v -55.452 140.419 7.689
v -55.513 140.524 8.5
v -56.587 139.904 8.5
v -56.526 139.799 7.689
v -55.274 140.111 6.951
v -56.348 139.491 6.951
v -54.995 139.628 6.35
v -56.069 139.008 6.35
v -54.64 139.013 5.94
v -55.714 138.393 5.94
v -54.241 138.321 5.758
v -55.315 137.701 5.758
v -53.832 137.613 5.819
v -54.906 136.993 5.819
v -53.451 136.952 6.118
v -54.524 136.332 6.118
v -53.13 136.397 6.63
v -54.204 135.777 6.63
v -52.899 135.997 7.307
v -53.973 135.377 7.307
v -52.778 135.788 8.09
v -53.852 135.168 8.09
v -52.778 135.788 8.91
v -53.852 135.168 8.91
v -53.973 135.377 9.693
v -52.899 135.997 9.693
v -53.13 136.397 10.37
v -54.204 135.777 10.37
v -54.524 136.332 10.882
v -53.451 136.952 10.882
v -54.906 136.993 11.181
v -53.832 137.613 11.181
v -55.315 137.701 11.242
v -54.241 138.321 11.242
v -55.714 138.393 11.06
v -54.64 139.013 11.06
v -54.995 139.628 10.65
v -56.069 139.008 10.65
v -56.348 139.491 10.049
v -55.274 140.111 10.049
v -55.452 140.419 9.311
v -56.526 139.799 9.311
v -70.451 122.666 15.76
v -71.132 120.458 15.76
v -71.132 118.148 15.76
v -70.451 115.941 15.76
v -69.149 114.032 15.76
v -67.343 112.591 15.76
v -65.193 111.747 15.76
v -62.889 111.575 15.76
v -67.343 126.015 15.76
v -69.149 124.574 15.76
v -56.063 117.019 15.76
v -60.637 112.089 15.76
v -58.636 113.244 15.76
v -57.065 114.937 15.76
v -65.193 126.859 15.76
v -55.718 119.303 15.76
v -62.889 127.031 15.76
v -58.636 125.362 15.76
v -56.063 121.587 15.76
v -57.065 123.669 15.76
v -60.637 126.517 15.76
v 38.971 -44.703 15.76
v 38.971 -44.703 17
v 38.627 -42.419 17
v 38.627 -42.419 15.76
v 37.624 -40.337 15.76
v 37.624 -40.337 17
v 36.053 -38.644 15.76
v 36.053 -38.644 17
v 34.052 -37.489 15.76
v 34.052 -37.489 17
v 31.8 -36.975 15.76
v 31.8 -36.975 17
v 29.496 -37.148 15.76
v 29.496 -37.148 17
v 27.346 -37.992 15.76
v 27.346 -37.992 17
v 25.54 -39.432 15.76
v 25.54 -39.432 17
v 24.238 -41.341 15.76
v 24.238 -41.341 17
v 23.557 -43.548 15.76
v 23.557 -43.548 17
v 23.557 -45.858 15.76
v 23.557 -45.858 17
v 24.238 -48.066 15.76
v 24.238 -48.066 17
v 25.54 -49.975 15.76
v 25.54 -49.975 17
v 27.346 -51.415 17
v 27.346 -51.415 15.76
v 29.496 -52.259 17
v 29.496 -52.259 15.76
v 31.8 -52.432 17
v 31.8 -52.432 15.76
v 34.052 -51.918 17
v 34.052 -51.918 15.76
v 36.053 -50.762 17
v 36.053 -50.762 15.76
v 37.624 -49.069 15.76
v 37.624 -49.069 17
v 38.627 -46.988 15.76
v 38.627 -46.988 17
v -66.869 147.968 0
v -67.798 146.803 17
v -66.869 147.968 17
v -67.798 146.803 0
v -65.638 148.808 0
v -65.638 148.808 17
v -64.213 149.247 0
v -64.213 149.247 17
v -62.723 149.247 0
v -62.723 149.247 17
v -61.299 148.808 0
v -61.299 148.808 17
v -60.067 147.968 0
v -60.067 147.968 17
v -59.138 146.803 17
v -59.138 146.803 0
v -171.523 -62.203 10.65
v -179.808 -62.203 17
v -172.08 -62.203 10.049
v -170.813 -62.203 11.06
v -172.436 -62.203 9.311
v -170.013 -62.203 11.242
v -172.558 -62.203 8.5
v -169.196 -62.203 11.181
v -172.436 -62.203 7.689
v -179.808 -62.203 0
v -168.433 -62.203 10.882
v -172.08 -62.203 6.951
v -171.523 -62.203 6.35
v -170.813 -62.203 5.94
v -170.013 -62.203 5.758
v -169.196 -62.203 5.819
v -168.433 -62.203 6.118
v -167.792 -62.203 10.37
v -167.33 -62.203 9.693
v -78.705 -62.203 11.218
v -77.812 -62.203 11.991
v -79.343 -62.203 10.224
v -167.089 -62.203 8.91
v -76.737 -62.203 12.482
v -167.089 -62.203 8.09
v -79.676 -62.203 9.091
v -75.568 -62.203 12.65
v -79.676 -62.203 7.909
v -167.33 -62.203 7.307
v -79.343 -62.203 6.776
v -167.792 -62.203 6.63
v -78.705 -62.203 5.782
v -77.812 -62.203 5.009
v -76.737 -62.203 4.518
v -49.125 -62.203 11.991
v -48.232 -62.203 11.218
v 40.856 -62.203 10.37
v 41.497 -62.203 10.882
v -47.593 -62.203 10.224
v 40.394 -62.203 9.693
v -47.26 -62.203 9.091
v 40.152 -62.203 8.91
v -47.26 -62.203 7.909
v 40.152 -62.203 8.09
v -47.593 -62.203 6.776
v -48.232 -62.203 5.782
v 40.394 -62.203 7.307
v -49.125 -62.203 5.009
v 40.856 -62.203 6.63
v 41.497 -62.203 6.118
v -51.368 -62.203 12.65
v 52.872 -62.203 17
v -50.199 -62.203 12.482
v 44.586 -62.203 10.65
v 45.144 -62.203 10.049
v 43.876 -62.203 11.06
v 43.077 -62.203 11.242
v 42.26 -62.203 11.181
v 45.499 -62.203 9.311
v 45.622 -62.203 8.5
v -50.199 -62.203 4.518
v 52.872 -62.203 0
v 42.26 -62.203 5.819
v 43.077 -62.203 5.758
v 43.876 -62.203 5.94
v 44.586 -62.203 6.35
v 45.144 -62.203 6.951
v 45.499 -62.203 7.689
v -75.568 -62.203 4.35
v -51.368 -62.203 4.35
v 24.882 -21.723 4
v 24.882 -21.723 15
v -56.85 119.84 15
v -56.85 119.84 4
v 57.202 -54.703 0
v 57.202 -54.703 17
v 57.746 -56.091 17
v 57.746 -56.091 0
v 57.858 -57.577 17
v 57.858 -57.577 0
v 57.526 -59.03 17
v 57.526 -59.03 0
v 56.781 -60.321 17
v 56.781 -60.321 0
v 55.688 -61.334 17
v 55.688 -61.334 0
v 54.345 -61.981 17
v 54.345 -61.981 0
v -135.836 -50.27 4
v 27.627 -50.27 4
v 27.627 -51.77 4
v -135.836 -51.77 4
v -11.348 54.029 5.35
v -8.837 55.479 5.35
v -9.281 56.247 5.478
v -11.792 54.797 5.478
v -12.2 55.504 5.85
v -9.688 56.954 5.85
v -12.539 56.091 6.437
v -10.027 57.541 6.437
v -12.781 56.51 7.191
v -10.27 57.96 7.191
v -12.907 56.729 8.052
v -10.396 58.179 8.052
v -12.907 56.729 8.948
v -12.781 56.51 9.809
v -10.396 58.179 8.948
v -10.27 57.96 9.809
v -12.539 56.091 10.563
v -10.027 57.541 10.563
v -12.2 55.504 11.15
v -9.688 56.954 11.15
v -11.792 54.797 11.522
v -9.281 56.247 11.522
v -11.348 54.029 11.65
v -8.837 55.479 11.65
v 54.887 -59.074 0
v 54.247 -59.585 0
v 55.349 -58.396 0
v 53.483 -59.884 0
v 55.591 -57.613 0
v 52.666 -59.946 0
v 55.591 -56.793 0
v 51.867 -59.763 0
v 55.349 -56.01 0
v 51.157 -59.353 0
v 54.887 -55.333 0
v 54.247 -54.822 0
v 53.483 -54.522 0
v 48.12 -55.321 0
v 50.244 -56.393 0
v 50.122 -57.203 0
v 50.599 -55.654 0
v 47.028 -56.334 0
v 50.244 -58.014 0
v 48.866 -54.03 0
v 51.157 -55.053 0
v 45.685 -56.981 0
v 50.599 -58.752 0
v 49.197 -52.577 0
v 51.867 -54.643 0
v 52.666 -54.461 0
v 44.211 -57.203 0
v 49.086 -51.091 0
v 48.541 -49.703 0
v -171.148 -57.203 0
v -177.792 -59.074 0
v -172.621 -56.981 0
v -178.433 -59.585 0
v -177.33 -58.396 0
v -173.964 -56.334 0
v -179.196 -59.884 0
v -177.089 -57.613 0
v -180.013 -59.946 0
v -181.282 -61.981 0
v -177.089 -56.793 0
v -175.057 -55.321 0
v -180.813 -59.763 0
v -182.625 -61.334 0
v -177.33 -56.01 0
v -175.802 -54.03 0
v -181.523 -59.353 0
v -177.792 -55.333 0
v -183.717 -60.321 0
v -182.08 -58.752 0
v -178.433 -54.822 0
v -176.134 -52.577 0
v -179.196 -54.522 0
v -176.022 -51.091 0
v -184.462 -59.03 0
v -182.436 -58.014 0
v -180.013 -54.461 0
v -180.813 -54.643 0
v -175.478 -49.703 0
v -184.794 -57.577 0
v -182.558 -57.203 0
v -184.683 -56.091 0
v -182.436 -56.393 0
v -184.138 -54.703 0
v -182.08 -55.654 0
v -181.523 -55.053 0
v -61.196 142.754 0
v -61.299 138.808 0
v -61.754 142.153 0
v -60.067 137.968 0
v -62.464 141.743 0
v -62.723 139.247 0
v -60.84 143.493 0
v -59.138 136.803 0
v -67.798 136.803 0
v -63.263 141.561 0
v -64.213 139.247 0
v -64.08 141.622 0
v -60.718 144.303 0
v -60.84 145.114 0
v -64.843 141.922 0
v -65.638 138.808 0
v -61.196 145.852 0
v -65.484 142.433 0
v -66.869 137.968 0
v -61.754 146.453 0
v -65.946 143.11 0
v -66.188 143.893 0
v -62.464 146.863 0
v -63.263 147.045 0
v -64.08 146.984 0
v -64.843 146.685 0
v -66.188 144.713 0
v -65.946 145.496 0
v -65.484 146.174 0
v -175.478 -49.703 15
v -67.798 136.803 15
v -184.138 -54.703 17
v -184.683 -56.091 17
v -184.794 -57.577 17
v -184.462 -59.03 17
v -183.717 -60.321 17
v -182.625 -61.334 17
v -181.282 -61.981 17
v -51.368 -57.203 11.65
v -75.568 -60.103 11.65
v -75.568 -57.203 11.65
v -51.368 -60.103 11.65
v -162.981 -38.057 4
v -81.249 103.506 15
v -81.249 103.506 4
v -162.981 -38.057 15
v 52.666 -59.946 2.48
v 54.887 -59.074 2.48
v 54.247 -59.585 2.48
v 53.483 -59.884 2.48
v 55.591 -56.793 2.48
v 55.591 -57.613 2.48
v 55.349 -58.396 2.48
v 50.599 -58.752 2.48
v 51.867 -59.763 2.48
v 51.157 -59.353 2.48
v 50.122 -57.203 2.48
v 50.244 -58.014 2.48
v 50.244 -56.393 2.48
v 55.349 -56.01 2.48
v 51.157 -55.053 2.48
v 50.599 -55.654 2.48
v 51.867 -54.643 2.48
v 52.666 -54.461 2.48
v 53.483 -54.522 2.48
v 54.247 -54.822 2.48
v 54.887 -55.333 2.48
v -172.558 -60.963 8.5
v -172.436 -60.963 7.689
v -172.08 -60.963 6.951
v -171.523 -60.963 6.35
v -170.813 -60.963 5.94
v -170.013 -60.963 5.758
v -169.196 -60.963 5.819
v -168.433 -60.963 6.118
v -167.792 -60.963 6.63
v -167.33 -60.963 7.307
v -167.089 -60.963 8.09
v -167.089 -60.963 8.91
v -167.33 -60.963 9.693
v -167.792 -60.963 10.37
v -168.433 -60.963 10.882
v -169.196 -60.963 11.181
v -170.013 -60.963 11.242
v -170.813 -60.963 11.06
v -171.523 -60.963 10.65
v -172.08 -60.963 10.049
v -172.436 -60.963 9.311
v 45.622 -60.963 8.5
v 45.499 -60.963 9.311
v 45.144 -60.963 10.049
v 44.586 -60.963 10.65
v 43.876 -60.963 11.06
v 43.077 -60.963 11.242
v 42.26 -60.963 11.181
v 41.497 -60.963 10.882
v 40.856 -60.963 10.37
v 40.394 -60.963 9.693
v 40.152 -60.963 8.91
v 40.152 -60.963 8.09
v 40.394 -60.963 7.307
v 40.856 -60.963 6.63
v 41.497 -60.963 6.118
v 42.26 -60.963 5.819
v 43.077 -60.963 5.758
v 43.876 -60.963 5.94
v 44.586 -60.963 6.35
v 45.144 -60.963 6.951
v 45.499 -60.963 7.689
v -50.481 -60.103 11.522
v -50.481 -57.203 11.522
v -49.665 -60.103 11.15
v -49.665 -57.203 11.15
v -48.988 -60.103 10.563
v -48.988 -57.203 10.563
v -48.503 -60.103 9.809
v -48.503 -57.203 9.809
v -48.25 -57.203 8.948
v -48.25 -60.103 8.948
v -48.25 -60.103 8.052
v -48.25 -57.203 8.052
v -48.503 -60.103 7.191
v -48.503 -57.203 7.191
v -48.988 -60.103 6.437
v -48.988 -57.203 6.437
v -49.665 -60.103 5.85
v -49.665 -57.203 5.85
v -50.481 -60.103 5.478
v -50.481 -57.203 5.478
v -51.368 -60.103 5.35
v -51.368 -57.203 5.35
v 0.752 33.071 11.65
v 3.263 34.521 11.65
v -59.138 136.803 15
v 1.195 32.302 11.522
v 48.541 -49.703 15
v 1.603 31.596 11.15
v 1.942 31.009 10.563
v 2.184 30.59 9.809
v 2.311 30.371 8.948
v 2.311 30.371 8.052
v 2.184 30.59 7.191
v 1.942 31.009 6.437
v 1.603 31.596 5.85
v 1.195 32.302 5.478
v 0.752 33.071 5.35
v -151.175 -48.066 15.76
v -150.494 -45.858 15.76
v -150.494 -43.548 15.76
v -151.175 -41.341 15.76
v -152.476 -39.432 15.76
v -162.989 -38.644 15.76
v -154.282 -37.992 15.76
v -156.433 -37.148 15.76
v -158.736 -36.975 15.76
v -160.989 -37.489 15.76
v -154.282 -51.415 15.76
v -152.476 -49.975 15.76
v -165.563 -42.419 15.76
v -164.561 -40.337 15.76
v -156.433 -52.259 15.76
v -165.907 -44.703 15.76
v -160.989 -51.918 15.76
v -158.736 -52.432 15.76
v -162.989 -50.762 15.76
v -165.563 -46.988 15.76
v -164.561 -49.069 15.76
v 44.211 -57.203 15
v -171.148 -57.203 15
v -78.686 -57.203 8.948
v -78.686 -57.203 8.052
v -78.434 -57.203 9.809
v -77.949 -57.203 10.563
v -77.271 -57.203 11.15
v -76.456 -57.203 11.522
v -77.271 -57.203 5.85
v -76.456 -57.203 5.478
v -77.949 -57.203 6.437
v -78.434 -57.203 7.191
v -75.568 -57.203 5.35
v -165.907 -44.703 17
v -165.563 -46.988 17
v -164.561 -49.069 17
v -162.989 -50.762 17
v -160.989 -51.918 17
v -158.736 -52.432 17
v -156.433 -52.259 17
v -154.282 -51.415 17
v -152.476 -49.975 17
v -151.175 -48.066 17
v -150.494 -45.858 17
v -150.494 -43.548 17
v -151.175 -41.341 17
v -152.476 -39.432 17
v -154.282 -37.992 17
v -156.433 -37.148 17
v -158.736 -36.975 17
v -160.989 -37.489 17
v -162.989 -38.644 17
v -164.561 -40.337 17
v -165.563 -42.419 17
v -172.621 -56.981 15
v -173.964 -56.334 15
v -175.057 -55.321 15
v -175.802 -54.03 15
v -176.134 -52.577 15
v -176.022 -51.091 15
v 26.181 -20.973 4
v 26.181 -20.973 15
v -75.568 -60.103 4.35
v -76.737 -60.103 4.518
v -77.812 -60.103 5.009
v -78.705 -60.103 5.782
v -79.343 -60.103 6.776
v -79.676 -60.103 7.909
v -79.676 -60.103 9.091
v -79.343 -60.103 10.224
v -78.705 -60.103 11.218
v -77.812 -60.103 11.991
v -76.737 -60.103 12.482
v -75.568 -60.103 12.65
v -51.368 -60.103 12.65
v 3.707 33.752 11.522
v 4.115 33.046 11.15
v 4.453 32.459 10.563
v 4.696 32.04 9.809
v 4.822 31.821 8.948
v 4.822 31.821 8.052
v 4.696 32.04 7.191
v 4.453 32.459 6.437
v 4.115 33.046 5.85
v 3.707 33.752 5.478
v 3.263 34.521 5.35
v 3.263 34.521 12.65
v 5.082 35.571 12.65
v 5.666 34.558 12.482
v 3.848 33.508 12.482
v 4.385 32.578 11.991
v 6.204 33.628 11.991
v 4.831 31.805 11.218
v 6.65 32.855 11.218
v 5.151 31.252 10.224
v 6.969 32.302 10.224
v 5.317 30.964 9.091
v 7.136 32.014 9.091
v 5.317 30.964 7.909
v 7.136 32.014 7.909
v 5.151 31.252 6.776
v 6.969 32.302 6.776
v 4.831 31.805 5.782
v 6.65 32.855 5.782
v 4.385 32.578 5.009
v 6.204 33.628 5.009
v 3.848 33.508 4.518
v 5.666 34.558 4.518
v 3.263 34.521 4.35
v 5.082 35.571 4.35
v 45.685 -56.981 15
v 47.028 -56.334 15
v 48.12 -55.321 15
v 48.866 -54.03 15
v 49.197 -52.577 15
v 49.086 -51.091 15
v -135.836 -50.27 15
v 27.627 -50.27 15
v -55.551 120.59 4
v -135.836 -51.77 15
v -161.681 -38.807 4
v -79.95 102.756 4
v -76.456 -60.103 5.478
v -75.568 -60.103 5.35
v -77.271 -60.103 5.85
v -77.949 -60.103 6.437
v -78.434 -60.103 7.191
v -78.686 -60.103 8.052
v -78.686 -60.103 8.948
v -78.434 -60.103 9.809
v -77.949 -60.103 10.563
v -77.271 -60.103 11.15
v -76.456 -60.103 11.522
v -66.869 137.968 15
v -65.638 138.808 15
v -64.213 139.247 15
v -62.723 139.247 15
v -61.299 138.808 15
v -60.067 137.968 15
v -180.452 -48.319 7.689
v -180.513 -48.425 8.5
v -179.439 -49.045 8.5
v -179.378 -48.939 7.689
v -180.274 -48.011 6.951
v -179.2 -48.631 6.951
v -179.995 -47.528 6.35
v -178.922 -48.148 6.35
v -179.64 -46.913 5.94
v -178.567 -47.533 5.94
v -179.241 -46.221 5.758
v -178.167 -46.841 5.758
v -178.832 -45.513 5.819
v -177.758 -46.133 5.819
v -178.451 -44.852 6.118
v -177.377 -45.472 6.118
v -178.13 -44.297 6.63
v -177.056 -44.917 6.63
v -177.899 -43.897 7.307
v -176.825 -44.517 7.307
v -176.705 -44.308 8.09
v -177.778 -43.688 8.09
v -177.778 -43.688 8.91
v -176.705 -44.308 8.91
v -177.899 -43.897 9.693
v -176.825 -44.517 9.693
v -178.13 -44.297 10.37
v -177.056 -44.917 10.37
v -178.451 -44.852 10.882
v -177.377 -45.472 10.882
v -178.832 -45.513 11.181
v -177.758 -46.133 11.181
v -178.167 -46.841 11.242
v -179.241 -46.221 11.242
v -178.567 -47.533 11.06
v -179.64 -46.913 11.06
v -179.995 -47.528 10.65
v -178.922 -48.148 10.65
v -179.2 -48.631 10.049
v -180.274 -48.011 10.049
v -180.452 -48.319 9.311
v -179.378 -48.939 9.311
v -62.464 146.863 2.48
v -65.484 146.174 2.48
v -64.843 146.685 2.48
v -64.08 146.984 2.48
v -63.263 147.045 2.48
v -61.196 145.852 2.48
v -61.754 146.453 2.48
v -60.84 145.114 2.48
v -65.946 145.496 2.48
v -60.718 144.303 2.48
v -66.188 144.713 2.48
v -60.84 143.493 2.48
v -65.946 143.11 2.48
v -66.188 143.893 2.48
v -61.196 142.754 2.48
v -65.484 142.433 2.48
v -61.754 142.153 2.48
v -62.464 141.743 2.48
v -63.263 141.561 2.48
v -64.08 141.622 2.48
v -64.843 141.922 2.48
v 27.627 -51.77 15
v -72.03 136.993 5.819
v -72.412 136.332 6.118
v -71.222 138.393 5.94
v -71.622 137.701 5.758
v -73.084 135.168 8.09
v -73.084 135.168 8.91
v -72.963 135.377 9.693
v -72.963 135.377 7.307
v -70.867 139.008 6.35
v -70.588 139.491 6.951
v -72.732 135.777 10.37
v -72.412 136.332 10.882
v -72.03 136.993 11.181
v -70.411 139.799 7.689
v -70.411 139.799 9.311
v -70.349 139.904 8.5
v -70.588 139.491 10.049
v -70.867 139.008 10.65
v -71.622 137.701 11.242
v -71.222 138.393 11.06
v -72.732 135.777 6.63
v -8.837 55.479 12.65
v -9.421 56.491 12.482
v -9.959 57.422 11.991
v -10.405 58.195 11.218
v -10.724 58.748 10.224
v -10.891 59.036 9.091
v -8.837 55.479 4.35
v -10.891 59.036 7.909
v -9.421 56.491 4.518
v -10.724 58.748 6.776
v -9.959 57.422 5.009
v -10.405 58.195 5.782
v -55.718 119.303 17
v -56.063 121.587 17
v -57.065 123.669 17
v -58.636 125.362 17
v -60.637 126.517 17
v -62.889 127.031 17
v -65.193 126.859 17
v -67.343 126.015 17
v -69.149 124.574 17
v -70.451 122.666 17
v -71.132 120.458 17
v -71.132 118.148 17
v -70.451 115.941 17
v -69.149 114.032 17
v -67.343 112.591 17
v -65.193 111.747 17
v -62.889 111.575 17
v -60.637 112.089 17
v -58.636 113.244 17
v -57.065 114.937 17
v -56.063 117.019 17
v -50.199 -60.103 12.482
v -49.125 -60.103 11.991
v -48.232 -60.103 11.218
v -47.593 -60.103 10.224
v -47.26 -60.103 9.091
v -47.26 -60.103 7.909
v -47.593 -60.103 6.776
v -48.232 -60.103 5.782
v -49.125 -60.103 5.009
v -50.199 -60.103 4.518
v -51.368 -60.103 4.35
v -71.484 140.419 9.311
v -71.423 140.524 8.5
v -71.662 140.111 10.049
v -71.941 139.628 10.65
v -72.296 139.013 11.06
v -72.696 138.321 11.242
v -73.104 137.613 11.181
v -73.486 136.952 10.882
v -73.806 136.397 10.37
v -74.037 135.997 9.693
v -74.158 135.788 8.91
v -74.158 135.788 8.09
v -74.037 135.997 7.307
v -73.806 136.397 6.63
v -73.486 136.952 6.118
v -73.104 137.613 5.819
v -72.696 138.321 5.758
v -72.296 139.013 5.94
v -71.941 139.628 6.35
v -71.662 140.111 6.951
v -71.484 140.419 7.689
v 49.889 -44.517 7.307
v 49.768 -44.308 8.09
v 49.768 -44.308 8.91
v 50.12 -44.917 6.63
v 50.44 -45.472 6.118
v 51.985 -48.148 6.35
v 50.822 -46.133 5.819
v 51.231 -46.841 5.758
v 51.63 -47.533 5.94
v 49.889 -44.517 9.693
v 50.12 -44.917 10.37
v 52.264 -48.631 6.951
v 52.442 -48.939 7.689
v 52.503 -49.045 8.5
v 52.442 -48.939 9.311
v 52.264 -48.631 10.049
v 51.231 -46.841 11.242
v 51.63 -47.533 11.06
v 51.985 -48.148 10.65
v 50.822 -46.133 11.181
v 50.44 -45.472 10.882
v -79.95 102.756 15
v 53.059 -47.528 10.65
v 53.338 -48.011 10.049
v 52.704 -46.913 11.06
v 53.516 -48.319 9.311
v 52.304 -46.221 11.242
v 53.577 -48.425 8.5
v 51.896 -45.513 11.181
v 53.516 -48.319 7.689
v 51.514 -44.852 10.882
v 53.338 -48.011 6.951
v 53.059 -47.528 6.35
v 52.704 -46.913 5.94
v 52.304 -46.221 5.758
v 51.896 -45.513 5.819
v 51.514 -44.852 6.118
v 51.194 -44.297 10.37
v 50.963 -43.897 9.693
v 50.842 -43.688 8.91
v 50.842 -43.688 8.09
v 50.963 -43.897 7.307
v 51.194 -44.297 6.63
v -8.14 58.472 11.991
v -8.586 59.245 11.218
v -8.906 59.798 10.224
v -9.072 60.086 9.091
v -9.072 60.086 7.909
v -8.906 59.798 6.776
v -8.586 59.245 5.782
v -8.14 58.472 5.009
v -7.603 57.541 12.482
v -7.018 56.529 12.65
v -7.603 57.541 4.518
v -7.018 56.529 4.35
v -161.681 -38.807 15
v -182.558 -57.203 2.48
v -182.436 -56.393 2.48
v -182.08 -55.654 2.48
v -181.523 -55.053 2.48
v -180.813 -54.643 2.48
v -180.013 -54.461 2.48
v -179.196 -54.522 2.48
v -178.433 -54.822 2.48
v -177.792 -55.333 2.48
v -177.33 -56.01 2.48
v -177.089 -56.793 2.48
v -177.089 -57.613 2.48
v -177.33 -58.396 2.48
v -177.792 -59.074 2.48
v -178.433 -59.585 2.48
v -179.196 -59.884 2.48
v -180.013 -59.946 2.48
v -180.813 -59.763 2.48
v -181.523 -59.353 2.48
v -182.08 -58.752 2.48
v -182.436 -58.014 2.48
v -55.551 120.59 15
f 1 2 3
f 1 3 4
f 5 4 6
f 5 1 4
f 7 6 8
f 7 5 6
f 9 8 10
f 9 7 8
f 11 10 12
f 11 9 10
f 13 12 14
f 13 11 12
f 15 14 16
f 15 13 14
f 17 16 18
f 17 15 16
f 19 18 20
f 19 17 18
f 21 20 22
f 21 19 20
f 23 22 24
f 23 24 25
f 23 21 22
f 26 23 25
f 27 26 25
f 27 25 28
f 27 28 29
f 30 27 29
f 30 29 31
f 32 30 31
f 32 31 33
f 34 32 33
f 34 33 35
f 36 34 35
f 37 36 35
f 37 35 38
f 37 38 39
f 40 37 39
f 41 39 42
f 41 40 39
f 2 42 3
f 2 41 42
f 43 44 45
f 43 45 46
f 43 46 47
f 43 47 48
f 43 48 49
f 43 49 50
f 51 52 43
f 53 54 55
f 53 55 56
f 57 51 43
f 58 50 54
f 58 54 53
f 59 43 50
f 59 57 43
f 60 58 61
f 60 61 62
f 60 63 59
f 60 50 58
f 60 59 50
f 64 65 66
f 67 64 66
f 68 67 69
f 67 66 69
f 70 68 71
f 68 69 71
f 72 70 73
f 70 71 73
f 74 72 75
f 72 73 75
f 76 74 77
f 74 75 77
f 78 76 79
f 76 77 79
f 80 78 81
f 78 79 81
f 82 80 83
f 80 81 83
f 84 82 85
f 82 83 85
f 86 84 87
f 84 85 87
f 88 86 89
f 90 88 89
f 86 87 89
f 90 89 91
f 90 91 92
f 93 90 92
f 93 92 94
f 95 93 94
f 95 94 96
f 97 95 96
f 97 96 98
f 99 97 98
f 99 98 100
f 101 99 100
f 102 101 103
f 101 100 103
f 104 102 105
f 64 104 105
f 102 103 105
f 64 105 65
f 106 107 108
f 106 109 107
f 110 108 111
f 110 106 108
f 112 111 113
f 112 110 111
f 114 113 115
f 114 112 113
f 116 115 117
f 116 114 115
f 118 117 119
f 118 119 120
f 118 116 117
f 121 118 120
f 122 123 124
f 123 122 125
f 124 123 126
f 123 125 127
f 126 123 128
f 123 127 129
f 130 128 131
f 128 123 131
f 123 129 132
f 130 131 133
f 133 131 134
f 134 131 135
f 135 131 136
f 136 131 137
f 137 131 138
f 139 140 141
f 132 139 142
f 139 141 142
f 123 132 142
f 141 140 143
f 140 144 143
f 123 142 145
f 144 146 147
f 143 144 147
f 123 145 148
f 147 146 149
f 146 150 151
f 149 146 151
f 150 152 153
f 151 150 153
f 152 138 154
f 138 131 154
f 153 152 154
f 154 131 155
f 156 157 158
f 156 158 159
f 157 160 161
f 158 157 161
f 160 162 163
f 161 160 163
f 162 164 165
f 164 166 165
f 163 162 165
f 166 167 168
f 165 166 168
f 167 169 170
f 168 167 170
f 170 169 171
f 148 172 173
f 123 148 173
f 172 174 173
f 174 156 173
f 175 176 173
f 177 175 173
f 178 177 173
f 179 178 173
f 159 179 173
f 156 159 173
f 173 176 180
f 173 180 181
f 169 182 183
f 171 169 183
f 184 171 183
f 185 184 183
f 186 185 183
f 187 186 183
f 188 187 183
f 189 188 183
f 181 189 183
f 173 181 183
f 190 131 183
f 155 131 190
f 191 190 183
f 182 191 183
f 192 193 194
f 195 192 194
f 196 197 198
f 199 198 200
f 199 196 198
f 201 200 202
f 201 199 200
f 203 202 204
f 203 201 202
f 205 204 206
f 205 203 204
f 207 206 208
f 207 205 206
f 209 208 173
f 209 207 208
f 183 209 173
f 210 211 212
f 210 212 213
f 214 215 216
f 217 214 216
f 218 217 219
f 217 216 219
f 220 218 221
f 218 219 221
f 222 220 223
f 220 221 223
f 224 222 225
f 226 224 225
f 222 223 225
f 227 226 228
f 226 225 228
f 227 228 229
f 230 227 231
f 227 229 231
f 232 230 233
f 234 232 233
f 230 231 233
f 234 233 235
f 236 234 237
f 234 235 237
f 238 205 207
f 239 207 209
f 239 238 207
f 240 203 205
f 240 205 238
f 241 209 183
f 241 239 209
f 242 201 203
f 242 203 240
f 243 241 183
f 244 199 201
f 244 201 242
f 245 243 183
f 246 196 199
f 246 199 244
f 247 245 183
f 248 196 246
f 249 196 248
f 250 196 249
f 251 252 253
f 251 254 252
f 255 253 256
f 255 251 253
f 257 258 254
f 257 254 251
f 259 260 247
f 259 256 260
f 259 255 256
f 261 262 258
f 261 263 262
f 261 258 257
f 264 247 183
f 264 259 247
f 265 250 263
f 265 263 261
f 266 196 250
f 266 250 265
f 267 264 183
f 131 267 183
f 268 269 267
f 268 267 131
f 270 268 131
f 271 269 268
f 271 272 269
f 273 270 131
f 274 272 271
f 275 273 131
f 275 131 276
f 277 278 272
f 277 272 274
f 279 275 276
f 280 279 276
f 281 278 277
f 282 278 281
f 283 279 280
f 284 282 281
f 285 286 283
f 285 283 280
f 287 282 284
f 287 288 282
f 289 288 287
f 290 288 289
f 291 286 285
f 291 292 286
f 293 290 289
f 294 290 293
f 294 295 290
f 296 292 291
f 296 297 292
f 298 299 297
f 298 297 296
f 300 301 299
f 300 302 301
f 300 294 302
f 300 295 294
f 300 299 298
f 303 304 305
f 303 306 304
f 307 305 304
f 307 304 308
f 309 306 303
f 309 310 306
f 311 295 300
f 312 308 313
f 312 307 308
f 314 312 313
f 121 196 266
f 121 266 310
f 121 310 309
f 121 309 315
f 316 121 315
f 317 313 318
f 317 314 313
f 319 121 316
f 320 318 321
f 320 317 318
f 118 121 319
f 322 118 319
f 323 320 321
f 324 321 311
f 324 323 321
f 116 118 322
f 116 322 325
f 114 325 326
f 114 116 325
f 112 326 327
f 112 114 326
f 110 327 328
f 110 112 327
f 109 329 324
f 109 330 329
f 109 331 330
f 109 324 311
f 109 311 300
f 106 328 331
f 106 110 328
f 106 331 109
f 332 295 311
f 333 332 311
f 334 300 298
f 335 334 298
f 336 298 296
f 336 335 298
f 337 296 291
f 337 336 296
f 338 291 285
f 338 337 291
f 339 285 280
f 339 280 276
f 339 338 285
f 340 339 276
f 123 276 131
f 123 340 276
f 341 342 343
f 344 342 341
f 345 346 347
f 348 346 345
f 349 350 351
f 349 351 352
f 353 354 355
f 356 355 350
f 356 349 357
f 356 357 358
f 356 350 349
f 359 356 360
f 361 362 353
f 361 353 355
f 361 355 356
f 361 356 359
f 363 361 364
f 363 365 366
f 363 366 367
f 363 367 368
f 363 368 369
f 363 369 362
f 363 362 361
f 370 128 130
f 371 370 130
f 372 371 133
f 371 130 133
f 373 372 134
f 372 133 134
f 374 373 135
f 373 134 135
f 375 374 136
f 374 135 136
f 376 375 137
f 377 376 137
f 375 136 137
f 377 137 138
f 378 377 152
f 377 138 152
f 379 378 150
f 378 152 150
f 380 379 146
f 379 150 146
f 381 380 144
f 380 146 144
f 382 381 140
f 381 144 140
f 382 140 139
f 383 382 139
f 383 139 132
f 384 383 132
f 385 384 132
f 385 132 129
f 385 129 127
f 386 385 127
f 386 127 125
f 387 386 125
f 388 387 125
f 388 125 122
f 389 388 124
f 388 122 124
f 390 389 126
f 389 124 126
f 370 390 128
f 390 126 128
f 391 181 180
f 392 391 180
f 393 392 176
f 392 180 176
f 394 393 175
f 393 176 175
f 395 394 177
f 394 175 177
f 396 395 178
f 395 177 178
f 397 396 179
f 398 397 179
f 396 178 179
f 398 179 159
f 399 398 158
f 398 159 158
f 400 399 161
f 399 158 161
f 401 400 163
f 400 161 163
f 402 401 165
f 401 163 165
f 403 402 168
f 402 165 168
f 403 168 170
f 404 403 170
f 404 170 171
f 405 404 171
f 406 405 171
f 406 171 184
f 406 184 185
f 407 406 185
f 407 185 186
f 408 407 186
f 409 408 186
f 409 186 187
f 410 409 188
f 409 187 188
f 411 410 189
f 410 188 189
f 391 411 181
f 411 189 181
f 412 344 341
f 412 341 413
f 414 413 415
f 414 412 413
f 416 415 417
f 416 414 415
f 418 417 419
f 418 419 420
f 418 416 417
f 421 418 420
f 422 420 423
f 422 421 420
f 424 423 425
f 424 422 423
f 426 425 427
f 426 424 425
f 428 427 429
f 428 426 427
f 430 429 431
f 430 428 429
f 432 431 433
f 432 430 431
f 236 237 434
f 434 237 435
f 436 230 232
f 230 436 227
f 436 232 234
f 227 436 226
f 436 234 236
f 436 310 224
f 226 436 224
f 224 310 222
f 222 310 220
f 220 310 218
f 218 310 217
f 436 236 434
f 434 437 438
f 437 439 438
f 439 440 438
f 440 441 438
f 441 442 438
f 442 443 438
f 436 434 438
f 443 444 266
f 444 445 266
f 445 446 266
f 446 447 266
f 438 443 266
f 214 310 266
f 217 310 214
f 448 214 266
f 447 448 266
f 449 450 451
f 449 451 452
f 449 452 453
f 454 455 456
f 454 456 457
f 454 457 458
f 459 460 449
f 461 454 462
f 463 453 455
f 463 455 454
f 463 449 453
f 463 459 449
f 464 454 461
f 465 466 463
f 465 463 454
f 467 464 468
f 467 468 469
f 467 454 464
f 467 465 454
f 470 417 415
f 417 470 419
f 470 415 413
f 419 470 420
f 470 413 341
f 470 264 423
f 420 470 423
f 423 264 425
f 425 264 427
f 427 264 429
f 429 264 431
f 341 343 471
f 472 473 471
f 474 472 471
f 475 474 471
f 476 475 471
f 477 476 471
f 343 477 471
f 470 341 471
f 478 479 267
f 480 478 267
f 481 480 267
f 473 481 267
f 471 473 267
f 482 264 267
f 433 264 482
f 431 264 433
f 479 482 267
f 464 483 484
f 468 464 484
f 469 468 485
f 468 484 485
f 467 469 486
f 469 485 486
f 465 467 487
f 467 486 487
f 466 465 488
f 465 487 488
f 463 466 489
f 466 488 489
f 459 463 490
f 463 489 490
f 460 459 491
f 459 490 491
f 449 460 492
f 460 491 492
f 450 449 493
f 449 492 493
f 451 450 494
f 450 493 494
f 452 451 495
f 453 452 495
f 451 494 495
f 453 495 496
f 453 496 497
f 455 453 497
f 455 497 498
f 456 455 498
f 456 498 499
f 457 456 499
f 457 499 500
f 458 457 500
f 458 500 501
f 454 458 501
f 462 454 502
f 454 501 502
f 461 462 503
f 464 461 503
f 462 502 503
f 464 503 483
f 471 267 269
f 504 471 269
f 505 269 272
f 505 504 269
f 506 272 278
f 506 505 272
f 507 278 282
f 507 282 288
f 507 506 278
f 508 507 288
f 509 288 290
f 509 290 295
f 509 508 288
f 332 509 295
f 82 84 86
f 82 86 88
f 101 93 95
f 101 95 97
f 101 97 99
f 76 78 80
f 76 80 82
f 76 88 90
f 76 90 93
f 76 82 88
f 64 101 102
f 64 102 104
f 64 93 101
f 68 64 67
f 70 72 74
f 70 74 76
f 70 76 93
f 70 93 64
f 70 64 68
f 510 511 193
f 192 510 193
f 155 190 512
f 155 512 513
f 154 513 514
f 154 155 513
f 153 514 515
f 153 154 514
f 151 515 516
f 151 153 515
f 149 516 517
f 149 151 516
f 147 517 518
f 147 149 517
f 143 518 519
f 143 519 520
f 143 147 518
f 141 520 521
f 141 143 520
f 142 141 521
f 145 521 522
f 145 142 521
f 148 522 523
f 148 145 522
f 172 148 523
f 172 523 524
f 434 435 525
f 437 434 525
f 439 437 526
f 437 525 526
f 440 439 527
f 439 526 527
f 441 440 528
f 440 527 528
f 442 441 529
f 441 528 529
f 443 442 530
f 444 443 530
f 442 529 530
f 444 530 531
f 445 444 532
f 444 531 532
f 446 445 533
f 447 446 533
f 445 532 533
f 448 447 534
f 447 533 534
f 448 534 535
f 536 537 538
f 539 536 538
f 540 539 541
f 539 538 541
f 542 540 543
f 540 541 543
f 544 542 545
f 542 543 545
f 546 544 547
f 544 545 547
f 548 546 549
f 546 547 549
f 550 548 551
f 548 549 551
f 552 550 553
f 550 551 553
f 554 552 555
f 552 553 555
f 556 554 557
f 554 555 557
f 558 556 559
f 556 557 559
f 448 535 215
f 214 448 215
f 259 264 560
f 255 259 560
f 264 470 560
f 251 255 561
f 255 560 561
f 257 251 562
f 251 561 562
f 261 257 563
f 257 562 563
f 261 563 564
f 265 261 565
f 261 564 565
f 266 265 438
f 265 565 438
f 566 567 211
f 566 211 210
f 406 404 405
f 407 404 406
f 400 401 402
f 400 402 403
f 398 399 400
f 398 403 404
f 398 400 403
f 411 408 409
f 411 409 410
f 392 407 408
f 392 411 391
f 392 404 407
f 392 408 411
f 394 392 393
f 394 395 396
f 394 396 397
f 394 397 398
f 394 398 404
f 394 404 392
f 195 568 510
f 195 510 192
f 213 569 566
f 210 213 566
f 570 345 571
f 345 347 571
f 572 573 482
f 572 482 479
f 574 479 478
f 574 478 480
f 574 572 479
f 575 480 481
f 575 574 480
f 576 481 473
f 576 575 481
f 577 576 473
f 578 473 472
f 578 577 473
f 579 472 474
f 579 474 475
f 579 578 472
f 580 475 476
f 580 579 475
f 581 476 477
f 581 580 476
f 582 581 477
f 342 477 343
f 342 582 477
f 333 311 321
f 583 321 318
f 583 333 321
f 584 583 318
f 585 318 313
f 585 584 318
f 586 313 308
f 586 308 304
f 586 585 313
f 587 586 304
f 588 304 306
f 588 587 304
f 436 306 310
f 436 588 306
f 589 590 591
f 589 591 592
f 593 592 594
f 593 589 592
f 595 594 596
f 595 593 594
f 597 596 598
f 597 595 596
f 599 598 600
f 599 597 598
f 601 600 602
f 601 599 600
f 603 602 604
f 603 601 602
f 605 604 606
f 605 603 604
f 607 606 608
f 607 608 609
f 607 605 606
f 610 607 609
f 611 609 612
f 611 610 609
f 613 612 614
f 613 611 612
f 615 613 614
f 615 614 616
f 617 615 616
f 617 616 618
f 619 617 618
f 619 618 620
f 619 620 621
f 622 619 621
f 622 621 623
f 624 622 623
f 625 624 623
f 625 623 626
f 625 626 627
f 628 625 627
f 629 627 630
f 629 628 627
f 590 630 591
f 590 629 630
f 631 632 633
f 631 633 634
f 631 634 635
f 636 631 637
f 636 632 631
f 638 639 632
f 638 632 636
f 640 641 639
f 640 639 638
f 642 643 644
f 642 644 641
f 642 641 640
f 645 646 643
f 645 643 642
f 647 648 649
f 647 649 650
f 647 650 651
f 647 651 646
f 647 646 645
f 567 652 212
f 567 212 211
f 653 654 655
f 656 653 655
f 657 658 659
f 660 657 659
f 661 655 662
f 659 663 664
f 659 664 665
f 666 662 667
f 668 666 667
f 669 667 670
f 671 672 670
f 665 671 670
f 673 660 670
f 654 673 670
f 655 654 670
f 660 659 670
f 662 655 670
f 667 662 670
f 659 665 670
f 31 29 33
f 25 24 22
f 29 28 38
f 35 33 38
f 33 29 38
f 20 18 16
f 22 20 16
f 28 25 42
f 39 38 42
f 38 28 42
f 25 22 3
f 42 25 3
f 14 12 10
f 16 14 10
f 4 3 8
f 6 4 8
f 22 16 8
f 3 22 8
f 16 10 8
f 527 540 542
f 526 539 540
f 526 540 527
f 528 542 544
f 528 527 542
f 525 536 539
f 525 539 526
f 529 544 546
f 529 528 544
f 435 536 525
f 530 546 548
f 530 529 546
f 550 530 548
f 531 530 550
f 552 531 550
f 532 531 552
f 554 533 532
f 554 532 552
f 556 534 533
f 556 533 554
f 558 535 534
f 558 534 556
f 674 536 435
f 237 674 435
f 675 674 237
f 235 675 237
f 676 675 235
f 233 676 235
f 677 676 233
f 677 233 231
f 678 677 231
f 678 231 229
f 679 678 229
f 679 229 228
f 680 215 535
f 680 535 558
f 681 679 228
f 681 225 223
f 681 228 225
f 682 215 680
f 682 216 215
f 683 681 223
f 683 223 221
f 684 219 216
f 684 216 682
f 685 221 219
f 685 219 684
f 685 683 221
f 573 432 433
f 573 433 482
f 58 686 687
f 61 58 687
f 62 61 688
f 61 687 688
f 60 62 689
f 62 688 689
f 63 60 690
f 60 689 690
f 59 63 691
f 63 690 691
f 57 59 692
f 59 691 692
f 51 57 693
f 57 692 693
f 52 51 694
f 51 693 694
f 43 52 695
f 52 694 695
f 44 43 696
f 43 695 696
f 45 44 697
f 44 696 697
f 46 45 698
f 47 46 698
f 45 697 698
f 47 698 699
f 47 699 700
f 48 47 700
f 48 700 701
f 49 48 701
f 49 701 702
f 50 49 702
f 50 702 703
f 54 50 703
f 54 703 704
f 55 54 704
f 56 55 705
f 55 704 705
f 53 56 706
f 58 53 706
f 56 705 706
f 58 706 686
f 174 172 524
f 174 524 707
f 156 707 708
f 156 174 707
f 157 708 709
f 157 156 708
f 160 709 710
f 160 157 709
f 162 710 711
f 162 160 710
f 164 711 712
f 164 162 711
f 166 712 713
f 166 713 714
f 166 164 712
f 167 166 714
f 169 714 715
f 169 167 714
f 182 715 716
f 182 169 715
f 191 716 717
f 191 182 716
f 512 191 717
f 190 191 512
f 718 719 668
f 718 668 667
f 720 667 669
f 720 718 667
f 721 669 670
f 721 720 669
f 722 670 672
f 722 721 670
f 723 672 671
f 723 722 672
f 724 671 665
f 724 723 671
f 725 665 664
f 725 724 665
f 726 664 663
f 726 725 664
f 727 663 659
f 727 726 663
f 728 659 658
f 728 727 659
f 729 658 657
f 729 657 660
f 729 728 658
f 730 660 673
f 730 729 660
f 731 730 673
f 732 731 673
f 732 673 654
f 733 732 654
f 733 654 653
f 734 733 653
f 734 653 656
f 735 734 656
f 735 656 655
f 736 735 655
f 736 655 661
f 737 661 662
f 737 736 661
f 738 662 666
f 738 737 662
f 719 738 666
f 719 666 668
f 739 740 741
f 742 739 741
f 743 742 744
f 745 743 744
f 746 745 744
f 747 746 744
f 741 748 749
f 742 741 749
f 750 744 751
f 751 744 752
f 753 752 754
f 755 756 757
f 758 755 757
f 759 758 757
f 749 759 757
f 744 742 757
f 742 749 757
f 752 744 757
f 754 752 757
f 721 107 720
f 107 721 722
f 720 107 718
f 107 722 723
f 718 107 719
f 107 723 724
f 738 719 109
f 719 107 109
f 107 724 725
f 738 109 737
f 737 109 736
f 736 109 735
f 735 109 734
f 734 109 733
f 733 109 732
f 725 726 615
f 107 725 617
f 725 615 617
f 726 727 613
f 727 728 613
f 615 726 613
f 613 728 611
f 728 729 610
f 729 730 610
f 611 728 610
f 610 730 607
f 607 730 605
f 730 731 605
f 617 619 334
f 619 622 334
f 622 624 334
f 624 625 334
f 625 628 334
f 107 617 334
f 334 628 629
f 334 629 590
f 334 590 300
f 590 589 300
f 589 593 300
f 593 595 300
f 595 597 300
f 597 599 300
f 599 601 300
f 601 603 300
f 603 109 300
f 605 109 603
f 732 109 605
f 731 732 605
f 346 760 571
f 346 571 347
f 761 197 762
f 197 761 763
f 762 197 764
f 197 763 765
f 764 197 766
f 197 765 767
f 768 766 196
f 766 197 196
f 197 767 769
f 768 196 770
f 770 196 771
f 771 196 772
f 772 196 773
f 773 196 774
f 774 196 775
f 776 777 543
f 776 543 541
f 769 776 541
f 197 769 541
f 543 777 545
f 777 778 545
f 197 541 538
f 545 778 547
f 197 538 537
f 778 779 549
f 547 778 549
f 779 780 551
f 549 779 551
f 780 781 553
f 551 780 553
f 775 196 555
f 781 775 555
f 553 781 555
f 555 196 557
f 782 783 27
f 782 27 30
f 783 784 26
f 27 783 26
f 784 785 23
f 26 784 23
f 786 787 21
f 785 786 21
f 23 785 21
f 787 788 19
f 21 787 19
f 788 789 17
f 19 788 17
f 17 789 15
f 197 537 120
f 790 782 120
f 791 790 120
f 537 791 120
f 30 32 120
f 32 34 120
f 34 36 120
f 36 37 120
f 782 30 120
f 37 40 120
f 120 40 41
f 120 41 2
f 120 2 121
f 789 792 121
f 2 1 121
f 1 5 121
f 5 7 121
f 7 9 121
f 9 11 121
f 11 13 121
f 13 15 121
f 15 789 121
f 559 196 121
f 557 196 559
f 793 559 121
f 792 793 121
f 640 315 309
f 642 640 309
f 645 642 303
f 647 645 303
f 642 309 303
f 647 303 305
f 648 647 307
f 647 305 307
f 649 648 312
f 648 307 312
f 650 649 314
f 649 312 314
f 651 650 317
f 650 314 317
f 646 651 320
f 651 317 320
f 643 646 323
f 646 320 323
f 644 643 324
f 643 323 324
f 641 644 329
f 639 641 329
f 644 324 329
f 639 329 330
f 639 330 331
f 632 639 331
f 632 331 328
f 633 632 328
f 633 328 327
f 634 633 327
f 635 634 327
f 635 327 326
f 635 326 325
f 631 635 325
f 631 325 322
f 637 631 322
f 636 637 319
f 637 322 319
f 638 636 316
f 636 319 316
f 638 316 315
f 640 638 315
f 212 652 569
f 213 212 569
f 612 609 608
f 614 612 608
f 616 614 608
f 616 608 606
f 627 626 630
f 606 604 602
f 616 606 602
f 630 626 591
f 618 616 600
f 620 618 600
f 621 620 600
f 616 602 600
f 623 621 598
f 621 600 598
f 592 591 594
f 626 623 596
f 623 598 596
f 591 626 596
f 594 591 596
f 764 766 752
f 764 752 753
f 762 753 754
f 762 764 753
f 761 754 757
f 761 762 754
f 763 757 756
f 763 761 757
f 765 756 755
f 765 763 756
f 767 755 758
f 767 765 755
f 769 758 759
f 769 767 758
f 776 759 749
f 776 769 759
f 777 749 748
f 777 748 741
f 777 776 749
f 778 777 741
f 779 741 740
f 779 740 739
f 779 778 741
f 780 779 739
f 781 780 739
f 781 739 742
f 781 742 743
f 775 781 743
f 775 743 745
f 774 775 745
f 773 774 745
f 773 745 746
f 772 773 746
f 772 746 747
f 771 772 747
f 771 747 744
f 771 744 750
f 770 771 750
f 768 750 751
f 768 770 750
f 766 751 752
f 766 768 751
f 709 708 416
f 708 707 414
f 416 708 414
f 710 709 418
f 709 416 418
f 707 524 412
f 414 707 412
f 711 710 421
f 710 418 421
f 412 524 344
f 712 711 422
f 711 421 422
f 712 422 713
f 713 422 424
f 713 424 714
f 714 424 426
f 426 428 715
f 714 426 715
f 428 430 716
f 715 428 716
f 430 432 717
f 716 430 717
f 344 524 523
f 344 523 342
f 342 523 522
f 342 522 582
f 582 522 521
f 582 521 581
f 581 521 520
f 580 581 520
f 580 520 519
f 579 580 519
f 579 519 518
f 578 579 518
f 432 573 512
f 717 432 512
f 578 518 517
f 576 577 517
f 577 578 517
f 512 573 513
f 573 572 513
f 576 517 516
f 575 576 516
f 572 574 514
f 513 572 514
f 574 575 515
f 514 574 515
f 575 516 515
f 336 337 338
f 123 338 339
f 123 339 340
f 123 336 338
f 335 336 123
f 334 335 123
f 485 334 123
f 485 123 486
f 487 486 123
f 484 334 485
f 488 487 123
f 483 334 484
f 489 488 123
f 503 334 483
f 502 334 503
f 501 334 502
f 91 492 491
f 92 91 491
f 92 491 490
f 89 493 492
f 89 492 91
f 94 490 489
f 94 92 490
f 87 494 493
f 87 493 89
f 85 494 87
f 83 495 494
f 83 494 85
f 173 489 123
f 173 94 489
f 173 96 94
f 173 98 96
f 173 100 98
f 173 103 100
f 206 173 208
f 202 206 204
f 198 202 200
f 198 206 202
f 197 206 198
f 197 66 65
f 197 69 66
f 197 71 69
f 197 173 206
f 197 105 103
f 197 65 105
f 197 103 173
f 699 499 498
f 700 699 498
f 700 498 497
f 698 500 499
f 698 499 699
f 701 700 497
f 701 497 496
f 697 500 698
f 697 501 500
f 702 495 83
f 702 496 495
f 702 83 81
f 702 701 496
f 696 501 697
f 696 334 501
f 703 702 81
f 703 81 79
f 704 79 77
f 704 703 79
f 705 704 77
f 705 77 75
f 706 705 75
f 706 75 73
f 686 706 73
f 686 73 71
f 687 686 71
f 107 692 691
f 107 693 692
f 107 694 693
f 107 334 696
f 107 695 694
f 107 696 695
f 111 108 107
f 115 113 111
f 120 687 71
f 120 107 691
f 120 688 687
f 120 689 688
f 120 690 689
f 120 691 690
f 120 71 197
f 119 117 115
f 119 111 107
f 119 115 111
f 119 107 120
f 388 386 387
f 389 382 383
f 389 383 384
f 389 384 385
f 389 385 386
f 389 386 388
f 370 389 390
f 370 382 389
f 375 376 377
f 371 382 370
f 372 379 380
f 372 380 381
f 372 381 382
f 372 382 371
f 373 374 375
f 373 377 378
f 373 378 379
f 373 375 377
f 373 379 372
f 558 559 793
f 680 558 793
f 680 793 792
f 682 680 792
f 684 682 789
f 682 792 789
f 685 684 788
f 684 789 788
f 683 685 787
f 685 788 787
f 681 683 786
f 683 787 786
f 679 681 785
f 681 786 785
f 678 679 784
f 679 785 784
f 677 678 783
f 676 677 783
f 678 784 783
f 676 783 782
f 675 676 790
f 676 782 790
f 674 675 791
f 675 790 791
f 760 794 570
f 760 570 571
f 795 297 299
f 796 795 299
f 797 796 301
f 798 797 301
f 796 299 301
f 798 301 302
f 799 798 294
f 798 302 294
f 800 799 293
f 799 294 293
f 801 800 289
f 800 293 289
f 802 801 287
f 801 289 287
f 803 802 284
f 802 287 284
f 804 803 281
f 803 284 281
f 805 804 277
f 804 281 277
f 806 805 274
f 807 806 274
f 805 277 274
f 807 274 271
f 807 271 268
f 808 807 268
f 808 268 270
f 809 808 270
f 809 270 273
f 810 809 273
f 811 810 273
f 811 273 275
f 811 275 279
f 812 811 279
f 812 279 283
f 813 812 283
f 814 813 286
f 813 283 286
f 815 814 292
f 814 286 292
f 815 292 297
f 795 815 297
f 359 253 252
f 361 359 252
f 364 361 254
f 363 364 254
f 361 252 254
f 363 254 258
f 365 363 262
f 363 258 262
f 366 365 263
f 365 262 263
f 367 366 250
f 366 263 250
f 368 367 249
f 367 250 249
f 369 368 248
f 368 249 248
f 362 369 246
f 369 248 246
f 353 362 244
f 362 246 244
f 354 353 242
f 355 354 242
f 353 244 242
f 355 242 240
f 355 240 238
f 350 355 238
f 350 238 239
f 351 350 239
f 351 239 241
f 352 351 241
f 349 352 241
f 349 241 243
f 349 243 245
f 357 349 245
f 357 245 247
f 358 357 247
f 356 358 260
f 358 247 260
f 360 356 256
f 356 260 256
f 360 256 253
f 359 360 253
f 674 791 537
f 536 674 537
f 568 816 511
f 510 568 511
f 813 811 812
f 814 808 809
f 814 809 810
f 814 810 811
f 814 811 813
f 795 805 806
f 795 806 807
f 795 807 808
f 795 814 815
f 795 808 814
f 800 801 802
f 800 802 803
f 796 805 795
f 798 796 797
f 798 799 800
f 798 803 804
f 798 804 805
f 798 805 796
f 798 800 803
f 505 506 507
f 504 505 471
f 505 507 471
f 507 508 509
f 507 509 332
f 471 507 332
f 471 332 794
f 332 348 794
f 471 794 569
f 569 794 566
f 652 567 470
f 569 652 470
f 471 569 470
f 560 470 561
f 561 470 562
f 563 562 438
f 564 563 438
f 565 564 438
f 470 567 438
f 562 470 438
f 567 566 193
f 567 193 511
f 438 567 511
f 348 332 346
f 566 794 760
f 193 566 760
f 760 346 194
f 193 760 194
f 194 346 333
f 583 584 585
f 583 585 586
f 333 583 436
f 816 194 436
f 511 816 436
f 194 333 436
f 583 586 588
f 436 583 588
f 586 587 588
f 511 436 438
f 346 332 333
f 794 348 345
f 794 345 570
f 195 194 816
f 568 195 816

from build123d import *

# Parameters (mm, degrees)
BOSS_EXTRU_1_DEPTH      = 15
BOSS_EXTRU_2_DEPTH      = 2
ESQUISSE3_W             = 163.463234946
ESQUISSE3_H             = 1.5
BOSS_EXTRU_3_DEPTH      = 11
ENL_V_MAT_EXTRU_1_DEPTH = 2.1
ENL_V_MAT_EXTRU_2_REACH = 253.952
CONG_1_R                = 5
ESQUISSE6_R             = 7.75
ENL_V_MAT_EXTRU_3_DEPTH = 1.24
ESQUISSE7_R             = 2.75
ENL_V_MAT_EXTRU_4_DEPTH = 1.24
ESQUISSE8_R             = 2.75
ENL_V_MAT_EXTRU_5_DEPTH = 2.48


with BuildPart() as part:
    # Esquisse1 → Boss.-Extru.1 (new body)
    with BuildSketch(Plane.XY):
        Polygon((-188.46822613, -62.203229112), (-63.46822613, 154.303121834), (61.53177387, -62.203229112), align=None)
        Polygon((52.871519833, -57.203229112), (-179.807972092, -57.203229112), (-63.46822613, 144.303121834), align=None, mode=Mode.SUBTRACT)
    extrude(amount=BOSS_EXTRU_1_DEPTH)

    # Esquisse2 → Boss.-Extru.2 (add)
    with BuildSketch(Plane.XY.offset(15)):
        Polygon((-63.46822613, 154.303121834), (-188.46822613, -62.203229112), (61.53177387, -62.203229112), align=None)
    extrude(amount=BOSS_EXTRU_2_DEPTH)

    # Esquisse3 → Boss.-Extru.3 (add)
    with BuildSketch(Plane(origin=(0, 0, 15), x_dir=(-1, 0, 0), z_dir=(0, 0, -1))):
        Polygon((55.550904435, 120.589918399), (-26.180713039, -20.97339565), (-24.881674933, -21.72339565), (56.84994254, 119.839918399), align=None)
        Polygon((162.980529474, -38.057243537), (161.681491369, -38.807243537), (79.949873895, 102.756070511), (81.248912001, 103.506070511), align=None)
        with Locations((54.104595722, -51.020446973)):
            Rectangle(ESQUISSE3_W, ESQUISSE3_H)
    extrude(amount=BOSS_EXTRU_3_DEPTH)

    # Esquisse4 → Enlèv. mat.-Extru.1 (cut)
    with BuildSketch(Plane(origin=(19.214042099, 11.093232378, 0), x_dir=(0, 0, -1), z_dir=(0.8660254037844387, 0.5000000000000001, 0))):
        with BuildLine():
            Line((-12.65, 52.464536457), (-12.65, 28.264536457))
            ThreePointArc((-12.65, 28.264536457), (-8.5, 24.114536457), (-4.35, 28.264536457))
            Line((-4.35, 28.264536457), (-4.35, 52.464536457))
            ThreePointArc((-4.35, 52.464536457), (-8.5, 56.614536457), (-12.65, 52.464536457))
        make_face()
    enl_v_mat_extru_1 = extrude(amount=-ENL_V_MAT_EXTRU_1_DEPTH, mode=Mode.SUBTRACT)

    # Esquisse5 → Enlèv. mat.-Extru.2 (cut, up to next)
    with BuildSketch(Plane(origin=(17.395388751, 10.043232378, 0), x_dir=(0, 0, -1), z_dir=(0.8660254037844386, 0.5000000000000003, 0)), mode=Mode.PRIVATE) as enl_v_mat_extru_2_sk1:
        with BuildLine():
            Line((-11.65, 52.464536457), (-11.65, 28.264536457))
            ThreePointArc((-11.65, 28.264536457), (-8.5, 25.114536457), (-5.35, 28.264536457))
            Line((-5.35, 28.264536457), (-5.35, 52.464536457))
            ThreePointArc((-5.35, 52.464536457), (-8.5, 55.614536457), (-11.65, 52.464536457))
        make_face()
    enl_v_mat_extru_2_tool1 = extrude(enl_v_mat_extru_2_sk1.sketch, amount=-ENL_V_MAT_EXTRU_2_REACH, mode=Mode.PRIVATE) & part.part
    enl_v_mat_extru_2 = enl_v_mat_extru_2_tool1.solids().sort_by_distance((-2.786879, 44.999946, 8.5))[0]
    add(enl_v_mat_extru_2, mode=Mode.SUBTRACT)

    # Congé1
    cong_1_edges = [part.edges().sort_by_distance(p)[0] for p in [
        (52.871519833, -57.203229112, 7.5),
        (-63.46822613, 144.303121834, 7.5),
        (-179.807972092, -57.203229112, 7.5),
        (-188.46822613, -62.203229112, 8.5),
        (-63.46822613, 154.303121834, 8.5),
        (61.53177387, -62.203229112, 8.5),
    ]]
    fillet(cong_1_edges, radius=CONG_1_R)

    # Symétrie1: Enlèv. mat.-Extru.1, Enlèv. mat.-Extru.2 across plane
    add(enl_v_mat_extru_1.mirror(Plane(origin=(-11.551844836, -20.008382178, 0), x_dir=(0, 0, 1), z_dir=(0.5000000000000001, 0.8660254037844386, 0))), mode=Mode.SUBTRACT)
    add(enl_v_mat_extru_2.mirror(Plane(origin=(-11.551844836, -20.008382178, 0), x_dir=(0, 0, 1), z_dir=(0.5000000000000001, 0.8660254037844386, 0))), mode=Mode.SUBTRACT)

    # Esquisse6 → Enlèv. mat.-Extru.3 (cut)
    with BuildSketch(Plane.XY.offset(17)):
        with Locations((-63.46822613, 119.303121834)):
            Circle(ESQUISSE6_R)
        with Locations(Location((-158.157336997, -44.703229112, 0), (0, 0, 180))):
            Circle(ESQUISSE6_R)
        with Locations((31.220884738, -44.703229112)):
            Circle(ESQUISSE6_R)
    extrude(amount=-ENL_V_MAT_EXTRU_3_DEPTH, mode=Mode.SUBTRACT)

    # Esquisse7 → Enlèv. mat.-Extru.4 (cut)
    with BuildSketch(Plane.XZ.offset(62.203229112)):
        with Locations((42.871519833, 8.5)):
            Circle(ESQUISSE7_R)
        with Locations(Location((-169.807972092, 8.5, 0), (0, 0, 180))):
            Circle(ESQUISSE7_R)
    enl_v_mat_extru_4 = extrude(amount=-ENL_V_MAT_EXTRU_4_DEPTH, mode=Mode.SUBTRACT)

    # Symétrie2: Enlèv. mat.-Extru.4 across plane
    add(enl_v_mat_extru_4.mirror(Plane(origin=(-11.551844836, -20.008382178, 0), x_dir=(0, 0, 1), z_dir=(0.5000000000000001, 0.8660254037844386, 0))), mode=Mode.SUBTRACT)

    # Symétrie3: Enlèv. mat.-Extru.4 across plane
    add(enl_v_mat_extru_4.mirror(Plane(origin=(-20.182268228, 34.956713983, 0), x_dir=(0, 0, 1), z_dir=(0.5000000000000001, -0.8660254037844387, 0))), mode=Mode.SUBTRACT)

    # Esquisse8 → Enlèv. mat.-Extru.5 (cut)
    with BuildSketch(Plane(origin=(0, 0, 0), x_dir=(-1, 0, 0), z_dir=(0, 0, -1))):
        with Locations((-52.871519833, -57.203229112)):
            Circle(ESQUISSE8_R)
        with Locations(Location((63.46822613, 144.303121834, 0), (0, 0, 180))):
            Circle(ESQUISSE8_R)
        with Locations((179.807972092, -57.203229112)):
            Circle(ESQUISSE8_R)
    extrude(amount=-ENL_V_MAT_EXTRU_5_DEPTH, mode=Mode.SUBTRACT)


solid = part.part
